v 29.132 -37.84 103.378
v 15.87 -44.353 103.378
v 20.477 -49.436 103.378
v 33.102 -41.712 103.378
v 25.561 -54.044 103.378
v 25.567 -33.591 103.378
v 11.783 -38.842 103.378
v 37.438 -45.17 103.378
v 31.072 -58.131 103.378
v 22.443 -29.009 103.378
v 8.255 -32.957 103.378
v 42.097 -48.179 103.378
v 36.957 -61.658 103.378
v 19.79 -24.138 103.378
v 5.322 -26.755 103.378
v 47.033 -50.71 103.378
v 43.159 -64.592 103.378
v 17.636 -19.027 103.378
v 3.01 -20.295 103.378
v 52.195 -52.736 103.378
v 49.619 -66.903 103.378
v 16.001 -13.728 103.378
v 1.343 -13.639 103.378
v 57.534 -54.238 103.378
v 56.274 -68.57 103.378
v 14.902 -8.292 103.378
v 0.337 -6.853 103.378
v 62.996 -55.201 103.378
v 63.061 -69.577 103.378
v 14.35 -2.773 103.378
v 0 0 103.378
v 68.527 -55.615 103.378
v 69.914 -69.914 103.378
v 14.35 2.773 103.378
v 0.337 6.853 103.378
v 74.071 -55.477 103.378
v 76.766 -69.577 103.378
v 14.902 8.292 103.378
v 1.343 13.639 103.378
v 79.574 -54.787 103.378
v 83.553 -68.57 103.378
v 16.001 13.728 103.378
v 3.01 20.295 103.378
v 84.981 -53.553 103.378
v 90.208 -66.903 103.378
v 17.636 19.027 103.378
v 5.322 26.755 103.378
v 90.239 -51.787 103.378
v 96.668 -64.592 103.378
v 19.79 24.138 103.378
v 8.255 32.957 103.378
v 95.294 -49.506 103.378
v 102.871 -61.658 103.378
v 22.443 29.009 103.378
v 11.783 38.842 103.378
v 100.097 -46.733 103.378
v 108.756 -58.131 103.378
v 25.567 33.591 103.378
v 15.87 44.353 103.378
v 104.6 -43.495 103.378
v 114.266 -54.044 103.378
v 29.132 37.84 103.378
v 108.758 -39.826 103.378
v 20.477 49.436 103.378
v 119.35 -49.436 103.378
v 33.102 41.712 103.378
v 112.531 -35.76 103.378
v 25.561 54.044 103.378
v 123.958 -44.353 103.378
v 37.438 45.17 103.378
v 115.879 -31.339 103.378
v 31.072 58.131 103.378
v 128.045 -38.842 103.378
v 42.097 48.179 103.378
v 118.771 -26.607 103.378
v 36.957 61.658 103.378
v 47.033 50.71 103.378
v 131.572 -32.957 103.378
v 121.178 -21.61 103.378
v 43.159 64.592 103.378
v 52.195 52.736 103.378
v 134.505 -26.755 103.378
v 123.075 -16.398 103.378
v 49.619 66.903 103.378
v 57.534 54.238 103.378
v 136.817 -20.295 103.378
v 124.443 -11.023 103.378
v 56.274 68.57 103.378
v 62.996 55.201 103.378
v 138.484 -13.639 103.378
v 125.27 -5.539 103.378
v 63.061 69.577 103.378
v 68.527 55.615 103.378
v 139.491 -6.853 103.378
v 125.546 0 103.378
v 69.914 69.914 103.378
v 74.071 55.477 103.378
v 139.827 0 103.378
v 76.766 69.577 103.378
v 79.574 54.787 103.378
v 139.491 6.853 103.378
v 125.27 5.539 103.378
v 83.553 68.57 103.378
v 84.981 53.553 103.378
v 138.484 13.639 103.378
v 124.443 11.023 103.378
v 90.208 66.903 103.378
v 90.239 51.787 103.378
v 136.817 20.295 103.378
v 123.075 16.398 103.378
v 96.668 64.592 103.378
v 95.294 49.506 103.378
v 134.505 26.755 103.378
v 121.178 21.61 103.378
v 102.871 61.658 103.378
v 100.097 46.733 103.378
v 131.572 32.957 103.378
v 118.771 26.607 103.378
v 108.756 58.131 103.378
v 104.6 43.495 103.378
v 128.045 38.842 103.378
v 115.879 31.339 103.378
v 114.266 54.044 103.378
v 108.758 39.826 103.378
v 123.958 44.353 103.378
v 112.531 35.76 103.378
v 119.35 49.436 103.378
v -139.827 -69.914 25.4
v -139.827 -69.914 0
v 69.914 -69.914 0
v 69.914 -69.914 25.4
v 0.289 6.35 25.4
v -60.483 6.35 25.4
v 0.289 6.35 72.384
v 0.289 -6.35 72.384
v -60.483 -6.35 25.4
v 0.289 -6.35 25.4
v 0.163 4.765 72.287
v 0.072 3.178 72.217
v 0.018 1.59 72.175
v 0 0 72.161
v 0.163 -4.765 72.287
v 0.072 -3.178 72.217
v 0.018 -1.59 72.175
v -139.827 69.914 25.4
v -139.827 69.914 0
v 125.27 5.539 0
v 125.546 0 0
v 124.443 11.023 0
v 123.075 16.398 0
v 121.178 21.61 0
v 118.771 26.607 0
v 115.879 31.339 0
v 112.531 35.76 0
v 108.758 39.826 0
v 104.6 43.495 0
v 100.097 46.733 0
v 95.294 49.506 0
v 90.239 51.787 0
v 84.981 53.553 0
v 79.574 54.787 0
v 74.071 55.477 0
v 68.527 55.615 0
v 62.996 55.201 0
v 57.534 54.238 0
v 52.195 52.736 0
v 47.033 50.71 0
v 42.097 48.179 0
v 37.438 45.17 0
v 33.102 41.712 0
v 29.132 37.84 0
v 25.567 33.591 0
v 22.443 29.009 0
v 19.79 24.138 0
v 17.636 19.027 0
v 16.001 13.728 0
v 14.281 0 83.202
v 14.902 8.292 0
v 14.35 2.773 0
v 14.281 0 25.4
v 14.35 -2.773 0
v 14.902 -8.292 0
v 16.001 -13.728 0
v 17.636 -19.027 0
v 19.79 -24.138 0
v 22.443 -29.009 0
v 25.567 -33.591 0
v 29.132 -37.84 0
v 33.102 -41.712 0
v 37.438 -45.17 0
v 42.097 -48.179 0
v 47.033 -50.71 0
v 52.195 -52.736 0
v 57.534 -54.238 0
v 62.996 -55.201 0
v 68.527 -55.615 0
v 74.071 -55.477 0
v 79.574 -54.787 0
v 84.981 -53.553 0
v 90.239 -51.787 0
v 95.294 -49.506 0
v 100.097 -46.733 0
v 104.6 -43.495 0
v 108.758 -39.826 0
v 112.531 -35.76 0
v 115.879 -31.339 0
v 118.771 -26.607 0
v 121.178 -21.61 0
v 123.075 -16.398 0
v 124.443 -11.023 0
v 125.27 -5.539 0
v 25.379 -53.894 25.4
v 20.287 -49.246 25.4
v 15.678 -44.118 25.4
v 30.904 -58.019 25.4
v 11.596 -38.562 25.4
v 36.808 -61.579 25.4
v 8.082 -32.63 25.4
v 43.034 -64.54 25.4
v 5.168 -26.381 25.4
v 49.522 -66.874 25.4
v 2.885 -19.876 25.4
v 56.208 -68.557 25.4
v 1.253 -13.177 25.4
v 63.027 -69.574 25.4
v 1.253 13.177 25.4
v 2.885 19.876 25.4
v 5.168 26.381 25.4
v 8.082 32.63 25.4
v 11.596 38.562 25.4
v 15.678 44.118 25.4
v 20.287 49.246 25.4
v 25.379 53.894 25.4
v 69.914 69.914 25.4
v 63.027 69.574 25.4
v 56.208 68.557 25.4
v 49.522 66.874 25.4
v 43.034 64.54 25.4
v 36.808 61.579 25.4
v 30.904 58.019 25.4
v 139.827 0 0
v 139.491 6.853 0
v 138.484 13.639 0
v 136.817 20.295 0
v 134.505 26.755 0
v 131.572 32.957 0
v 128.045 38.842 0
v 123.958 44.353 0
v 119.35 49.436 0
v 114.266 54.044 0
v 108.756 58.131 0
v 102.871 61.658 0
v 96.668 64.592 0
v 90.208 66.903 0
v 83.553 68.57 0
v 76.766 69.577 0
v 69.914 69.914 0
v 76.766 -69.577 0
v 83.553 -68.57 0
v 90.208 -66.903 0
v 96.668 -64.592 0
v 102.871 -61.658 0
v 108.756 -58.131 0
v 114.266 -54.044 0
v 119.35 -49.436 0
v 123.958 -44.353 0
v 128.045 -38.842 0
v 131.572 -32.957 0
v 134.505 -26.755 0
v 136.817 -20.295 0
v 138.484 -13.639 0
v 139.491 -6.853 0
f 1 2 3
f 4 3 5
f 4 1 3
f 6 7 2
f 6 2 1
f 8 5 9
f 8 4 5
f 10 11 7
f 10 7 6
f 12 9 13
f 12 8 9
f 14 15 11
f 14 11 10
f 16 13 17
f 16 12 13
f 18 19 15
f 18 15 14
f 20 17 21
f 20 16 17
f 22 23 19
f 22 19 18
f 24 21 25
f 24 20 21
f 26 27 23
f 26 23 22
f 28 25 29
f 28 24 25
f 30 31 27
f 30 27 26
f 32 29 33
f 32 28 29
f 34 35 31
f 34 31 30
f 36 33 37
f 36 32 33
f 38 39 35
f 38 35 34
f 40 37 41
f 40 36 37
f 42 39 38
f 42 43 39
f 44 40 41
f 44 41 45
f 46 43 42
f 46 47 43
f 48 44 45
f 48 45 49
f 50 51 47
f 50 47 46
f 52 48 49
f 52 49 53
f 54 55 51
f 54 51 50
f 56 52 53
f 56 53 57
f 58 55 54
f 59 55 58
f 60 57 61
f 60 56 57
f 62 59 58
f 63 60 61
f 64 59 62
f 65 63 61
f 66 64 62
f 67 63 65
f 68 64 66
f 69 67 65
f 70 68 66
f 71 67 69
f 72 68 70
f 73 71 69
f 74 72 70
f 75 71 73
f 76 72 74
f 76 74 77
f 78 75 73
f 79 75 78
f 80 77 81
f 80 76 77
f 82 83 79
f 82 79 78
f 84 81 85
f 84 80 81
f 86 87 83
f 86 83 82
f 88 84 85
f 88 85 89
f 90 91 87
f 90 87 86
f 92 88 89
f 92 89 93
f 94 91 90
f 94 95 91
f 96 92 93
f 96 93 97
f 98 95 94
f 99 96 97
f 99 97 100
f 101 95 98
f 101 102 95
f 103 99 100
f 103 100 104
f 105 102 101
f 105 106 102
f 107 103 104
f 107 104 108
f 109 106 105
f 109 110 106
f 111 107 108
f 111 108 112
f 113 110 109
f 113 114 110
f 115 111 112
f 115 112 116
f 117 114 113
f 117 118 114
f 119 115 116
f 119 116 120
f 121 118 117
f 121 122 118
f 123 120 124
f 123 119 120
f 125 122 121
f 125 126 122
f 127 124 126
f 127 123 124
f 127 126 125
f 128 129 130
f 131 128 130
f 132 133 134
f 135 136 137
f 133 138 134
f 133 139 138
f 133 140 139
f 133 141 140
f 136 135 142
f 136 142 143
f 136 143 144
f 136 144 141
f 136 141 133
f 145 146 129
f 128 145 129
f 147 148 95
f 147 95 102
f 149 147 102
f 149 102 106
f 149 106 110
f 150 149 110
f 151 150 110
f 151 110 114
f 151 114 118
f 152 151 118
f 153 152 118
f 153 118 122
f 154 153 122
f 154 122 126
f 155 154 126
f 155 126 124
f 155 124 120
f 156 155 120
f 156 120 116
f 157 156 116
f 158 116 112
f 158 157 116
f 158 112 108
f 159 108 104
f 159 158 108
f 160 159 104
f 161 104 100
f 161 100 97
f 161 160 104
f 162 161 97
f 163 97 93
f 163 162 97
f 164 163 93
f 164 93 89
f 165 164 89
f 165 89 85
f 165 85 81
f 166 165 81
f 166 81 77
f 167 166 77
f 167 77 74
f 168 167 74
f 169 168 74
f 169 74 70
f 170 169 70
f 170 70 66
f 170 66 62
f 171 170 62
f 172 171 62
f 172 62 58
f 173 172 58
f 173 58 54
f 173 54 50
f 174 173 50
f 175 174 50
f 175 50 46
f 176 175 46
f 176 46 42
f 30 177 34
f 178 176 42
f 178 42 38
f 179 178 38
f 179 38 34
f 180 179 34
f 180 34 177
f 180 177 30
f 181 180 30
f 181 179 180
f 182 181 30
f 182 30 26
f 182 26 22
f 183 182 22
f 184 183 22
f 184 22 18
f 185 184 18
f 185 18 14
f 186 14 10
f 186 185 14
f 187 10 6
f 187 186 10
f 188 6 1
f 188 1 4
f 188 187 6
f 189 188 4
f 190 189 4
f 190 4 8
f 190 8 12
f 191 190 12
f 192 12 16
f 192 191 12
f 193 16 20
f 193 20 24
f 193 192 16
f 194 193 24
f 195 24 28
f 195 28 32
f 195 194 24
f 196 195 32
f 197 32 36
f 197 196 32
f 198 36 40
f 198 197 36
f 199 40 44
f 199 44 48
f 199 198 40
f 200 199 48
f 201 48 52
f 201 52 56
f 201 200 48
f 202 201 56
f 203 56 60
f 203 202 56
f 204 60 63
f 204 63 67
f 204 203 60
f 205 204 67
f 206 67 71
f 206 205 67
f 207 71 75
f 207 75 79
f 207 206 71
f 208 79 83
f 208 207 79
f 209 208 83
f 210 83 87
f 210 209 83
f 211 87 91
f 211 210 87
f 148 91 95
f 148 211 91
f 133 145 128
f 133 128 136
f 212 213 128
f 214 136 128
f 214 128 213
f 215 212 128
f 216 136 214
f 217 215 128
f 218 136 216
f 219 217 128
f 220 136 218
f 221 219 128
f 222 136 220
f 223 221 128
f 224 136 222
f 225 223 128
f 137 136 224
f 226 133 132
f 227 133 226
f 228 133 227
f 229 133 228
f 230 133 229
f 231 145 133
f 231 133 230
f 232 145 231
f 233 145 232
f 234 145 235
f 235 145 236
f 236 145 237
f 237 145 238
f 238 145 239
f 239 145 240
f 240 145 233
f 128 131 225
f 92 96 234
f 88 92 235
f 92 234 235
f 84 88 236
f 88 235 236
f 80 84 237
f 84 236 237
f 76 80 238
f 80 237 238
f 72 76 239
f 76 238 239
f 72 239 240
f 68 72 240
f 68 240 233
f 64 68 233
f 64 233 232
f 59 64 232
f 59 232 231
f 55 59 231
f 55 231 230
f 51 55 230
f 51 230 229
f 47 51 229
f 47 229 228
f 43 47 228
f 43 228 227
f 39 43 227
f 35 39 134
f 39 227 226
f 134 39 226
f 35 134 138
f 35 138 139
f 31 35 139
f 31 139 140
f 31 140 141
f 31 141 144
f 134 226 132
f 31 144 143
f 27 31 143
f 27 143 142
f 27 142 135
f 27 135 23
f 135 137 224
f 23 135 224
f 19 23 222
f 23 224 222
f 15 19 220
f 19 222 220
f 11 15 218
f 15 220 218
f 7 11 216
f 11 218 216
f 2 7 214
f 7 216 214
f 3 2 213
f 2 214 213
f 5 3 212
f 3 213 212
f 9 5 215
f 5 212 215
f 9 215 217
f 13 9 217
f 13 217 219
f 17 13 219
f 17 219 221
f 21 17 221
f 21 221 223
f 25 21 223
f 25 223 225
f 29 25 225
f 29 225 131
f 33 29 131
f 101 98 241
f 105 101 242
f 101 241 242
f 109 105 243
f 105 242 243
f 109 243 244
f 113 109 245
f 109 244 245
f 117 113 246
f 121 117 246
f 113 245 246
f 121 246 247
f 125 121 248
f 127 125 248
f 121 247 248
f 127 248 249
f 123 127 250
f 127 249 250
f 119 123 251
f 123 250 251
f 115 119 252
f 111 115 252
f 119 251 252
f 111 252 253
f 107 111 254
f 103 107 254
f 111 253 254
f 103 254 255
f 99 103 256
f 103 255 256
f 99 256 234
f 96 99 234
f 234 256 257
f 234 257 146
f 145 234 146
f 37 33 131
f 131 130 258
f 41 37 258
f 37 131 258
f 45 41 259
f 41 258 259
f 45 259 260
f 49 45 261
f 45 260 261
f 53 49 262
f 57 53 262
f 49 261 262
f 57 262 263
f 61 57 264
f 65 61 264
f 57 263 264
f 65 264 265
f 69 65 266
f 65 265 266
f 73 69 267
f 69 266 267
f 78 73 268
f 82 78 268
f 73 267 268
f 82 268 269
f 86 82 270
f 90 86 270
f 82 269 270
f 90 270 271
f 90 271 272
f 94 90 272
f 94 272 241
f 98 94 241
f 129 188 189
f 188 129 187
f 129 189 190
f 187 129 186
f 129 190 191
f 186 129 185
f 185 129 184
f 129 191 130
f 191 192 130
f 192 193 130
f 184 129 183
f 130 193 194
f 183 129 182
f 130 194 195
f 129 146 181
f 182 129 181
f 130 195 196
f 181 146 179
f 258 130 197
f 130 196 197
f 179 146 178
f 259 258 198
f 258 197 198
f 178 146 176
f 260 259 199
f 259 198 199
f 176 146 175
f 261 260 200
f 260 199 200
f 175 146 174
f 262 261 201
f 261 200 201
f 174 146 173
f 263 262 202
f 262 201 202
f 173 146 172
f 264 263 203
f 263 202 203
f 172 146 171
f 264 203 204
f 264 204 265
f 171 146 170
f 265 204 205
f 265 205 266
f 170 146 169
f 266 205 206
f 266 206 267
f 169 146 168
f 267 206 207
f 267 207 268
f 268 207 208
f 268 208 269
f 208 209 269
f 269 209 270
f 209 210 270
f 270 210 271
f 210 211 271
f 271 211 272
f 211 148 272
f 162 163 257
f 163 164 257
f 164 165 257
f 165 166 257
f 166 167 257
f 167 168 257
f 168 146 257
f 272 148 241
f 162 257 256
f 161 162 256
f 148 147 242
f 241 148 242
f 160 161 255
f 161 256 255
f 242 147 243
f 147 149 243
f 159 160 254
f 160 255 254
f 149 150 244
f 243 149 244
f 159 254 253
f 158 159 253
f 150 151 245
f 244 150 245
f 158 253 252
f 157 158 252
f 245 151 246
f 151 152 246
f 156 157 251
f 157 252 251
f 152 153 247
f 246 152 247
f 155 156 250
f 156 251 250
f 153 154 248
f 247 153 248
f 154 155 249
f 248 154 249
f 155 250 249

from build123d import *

# Parameters (mm, degrees)
F0_R          = 55.632666
F1_DEPTH      = 25.4
F2_DEPTH      = 103.378
F4_DEPTH      = 6.35
F4_DEPTH_BACK = 6.35


with BuildPart() as f1:
    # F0 (on Top) → F1 (new body)
    with BuildSketch(Plane.XY):
        with BuildLine():
            Line((-139.827257, 69.913628), (-139.827257, -69.913628))
            Line((-139.827257, -69.913628), (69.913628, -69.913628))
            ThreePointArc((69.913628, -69.913628), (0, 0), (69.913628, 69.913628))
            Line((69.913628, 69.913628), (-139.827257, 69.913628))
        make_face()
        with BuildLine():
            ThreePointArc((69.913628, 69.913628), (0, 0), (69.913628, -69.913628))
            ThreePointArc((69.913628, -69.913628), (119.350029, -49.436401), (139.827257, 0))
            ThreePointArc((139.827257, 0), (119.350029, 49.436401), (69.913628, 69.913628))
        make_face()
        with Locations((69.913628, 0)):
            Circle(F0_R, mode=Mode.SUBTRACT)
    extrude(amount=F1_DEPTH)

    # F0 (on Top) → F2 (join)
    with BuildSketch(Plane.XY):
        with BuildLine():
            ThreePointArc((69.913628, 69.913628), (0, 0), (69.913628, -69.913628))
            ThreePointArc((69.913628, -69.913628), (119.350029, -49.436401), (139.827257, 0))
            ThreePointArc((139.827257, 0), (119.350029, 49.436401), (69.913628, 69.913628))
        make_face()
        with Locations((69.913628, 0)):
            Circle(F0_R, mode=Mode.SUBTRACT)
    extrude(amount=F2_DEPTH)

    # F3 (on Front) → F4 (join, two sides)
    with BuildSketch(Plane.XZ) as f4_sk:
        Polygon((14.280962, 83.201781), (-60.483344, 25.4), (14.280962, 25.4), align=None)
    extrude(amount=F4_DEPTH)
    extrude(f4_sk.sketch, amount=-F4_DEPTH_BACK)


solid = f1.part
